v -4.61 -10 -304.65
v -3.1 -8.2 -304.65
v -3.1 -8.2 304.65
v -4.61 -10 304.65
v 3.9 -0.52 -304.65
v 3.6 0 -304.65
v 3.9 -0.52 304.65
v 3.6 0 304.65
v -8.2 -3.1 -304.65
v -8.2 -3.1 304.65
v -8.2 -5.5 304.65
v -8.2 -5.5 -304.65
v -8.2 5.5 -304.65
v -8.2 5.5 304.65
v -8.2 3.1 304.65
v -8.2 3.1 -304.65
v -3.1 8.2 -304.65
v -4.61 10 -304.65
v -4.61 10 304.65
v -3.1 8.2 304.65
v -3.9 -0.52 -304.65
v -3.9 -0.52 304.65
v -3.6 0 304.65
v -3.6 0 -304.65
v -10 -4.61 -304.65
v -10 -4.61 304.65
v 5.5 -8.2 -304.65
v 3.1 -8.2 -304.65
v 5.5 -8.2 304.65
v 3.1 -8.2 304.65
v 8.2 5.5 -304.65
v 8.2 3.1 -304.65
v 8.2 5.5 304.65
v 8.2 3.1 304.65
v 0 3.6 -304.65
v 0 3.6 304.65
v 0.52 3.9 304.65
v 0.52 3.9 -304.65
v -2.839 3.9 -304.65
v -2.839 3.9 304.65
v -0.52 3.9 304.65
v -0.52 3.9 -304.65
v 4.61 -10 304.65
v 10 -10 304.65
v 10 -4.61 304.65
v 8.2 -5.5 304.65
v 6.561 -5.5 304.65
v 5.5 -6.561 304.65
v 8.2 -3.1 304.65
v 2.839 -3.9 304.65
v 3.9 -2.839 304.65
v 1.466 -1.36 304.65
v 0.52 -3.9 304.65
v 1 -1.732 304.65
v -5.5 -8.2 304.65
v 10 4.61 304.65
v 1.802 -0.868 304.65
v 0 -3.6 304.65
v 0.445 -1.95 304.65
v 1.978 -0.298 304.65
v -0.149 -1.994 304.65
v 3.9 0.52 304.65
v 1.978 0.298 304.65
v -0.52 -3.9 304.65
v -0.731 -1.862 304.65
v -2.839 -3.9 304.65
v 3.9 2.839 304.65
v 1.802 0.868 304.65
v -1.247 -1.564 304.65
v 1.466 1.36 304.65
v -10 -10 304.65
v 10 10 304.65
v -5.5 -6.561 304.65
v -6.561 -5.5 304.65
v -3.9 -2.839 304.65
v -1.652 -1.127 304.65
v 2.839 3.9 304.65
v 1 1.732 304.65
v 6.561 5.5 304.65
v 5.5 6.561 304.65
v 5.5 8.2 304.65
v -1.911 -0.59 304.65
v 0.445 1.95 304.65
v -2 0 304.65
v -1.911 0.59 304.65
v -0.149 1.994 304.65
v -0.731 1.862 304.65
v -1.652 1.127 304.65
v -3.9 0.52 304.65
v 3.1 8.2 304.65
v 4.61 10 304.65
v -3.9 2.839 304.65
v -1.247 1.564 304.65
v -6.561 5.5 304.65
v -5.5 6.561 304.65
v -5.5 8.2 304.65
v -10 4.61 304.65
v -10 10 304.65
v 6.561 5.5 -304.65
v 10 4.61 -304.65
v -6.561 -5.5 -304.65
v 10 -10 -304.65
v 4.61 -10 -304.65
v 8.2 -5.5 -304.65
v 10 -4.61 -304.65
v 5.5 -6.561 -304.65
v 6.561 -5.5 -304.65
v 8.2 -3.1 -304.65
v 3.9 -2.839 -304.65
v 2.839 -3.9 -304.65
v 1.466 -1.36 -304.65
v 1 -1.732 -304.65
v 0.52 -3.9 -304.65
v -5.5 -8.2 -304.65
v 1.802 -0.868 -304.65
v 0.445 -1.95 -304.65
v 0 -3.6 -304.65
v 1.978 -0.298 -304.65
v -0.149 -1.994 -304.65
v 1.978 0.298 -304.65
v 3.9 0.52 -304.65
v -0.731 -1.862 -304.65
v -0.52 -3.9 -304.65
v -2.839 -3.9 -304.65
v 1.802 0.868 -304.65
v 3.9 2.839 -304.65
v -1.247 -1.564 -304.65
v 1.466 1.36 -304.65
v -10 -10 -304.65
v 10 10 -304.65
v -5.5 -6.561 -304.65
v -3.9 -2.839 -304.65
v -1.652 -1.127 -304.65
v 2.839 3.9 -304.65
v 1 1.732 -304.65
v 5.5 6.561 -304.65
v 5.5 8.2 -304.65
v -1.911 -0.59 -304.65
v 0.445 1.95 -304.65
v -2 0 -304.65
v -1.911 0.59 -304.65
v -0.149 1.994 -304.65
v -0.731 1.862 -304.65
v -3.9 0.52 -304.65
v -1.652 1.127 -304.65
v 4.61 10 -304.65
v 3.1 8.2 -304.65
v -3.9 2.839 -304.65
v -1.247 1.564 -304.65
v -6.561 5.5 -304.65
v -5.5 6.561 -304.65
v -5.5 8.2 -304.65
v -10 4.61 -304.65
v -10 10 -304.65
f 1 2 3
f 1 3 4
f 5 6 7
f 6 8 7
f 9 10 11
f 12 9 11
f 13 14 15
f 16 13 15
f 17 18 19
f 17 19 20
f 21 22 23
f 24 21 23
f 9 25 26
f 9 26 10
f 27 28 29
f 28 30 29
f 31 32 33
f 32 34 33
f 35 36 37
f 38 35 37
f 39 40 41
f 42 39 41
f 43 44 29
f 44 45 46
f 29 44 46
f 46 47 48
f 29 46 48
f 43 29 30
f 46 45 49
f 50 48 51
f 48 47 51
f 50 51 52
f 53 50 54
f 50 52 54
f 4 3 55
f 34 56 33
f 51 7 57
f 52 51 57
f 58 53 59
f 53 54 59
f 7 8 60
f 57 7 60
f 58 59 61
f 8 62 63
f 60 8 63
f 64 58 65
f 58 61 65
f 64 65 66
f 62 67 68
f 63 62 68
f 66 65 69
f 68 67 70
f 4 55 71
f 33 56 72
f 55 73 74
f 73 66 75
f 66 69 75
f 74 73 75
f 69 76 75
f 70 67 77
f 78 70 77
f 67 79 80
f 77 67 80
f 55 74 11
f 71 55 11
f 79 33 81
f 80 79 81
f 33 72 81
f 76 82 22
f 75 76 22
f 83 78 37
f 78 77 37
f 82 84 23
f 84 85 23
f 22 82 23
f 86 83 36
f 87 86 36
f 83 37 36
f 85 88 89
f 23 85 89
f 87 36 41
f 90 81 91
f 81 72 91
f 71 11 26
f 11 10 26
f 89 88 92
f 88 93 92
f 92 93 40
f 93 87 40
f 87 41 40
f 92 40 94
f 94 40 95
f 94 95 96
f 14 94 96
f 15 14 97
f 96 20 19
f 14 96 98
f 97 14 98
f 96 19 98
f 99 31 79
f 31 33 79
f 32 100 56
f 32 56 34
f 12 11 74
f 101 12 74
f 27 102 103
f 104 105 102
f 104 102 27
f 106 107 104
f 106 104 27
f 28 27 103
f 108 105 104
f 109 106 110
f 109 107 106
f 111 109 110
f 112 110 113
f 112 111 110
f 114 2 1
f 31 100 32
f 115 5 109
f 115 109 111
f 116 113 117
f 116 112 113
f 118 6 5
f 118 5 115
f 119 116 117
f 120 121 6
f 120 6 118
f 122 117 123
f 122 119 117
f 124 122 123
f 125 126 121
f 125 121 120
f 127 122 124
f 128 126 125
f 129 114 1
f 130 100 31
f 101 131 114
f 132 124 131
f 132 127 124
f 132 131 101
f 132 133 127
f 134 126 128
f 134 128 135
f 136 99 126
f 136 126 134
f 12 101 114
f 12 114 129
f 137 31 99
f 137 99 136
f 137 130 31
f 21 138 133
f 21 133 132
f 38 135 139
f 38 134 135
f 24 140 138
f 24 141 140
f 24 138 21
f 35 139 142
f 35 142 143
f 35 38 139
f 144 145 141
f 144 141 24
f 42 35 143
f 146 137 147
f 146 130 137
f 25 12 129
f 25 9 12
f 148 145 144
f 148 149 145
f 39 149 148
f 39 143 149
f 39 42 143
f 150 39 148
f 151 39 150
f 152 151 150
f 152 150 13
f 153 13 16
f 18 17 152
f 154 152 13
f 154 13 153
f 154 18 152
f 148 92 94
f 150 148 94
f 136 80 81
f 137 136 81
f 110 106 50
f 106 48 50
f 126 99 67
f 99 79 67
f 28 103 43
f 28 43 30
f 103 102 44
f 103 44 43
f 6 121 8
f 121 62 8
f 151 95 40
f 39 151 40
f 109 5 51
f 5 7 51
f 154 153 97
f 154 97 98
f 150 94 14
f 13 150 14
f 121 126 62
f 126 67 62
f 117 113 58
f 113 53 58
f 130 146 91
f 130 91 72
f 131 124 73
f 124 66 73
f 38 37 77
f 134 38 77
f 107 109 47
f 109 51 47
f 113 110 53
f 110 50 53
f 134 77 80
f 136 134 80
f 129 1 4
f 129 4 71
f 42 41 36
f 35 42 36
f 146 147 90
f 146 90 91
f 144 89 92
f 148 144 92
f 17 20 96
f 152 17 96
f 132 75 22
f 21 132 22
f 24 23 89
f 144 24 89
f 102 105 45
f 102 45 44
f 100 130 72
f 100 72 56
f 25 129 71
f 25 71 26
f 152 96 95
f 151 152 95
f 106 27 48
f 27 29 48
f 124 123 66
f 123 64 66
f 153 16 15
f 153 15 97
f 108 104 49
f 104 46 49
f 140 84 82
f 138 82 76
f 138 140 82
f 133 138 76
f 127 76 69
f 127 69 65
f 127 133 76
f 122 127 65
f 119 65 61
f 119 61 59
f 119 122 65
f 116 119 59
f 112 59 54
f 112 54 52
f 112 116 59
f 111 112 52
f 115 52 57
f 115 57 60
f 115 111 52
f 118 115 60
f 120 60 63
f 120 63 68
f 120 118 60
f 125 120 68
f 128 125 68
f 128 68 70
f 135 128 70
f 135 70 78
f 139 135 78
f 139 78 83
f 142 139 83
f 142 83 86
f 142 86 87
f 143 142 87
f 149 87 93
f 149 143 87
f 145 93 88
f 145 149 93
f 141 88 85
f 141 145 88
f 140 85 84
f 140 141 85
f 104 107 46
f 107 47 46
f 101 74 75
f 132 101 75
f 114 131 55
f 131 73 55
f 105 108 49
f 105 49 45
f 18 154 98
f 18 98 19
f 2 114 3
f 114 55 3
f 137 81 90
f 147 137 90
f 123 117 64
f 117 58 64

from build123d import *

# Parameters (mm, degrees)
SKETCH1_R           = 2
BOSS_EXTRUDE1_DEPTH = 304.65


with BuildPart() as part:
    # Sketch1 → Boss-Extrude1 (new, symmetric)
    with BuildSketch(Plane.XY):
        Polygon((10, 10), (10, 4.610379336), (8.2, 3.1), (8.2, 5.5), (6.560660172, 5.5), (3.9, 2.839339828), (3.9, 0.519615242), (3.6, 0), (3.9, -0.519615242), (3.9, -2.839339828), (6.560660172, -5.5), (8.2, -5.5), (8.2, -3.1), (10, -4.610379336), (10, -10), (4.610379336, -10), (3.1, -8.2), (5.5, -8.2), (5.5, -6.560660172), (2.839339828, -3.9), (0.519615242, -3.9), (0, -3.6), (-0.519615242, -3.9), (-2.839339828, -3.9), (-5.5, -6.560660172), (-5.5, -8.2), (-3.1, -8.2), (-4.610379336, -10), (-10, -10), (-10, -4.610379336), (-8.2, -3.1), (-8.2, -5.5), (-6.560660172, -5.5), (-3.9, -2.839339828), (-3.9, -0.519615242), (-3.6, 0), (-3.9, 0.519615242), (-3.9, 2.839339828), (-6.560660172, 5.5), (-8.2, 5.5), (-8.2, 3.1), (-10, 4.610379336), (-10, 10), (-4.610379336, 10), (-3.1, 8.2), (-5.5, 8.2), (-5.5, 6.560660172), (-2.839339828, 3.9), (-0.519615242, 3.9), (0, 3.6), (0.519615242, 3.9), (2.839339828, 3.9), (5.5, 6.560660172), (5.5, 8.2), (3.1, 8.2), (4.610379336, 10), align=None)
        with Locations(Location((0, 0, 0), (0, 0, 180))):
            Circle(SKETCH1_R, mode=Mode.SUBTRACT)
    extrude(amount=BOSS_EXTRUDE1_DEPTH, both=True)


solid = part.part
